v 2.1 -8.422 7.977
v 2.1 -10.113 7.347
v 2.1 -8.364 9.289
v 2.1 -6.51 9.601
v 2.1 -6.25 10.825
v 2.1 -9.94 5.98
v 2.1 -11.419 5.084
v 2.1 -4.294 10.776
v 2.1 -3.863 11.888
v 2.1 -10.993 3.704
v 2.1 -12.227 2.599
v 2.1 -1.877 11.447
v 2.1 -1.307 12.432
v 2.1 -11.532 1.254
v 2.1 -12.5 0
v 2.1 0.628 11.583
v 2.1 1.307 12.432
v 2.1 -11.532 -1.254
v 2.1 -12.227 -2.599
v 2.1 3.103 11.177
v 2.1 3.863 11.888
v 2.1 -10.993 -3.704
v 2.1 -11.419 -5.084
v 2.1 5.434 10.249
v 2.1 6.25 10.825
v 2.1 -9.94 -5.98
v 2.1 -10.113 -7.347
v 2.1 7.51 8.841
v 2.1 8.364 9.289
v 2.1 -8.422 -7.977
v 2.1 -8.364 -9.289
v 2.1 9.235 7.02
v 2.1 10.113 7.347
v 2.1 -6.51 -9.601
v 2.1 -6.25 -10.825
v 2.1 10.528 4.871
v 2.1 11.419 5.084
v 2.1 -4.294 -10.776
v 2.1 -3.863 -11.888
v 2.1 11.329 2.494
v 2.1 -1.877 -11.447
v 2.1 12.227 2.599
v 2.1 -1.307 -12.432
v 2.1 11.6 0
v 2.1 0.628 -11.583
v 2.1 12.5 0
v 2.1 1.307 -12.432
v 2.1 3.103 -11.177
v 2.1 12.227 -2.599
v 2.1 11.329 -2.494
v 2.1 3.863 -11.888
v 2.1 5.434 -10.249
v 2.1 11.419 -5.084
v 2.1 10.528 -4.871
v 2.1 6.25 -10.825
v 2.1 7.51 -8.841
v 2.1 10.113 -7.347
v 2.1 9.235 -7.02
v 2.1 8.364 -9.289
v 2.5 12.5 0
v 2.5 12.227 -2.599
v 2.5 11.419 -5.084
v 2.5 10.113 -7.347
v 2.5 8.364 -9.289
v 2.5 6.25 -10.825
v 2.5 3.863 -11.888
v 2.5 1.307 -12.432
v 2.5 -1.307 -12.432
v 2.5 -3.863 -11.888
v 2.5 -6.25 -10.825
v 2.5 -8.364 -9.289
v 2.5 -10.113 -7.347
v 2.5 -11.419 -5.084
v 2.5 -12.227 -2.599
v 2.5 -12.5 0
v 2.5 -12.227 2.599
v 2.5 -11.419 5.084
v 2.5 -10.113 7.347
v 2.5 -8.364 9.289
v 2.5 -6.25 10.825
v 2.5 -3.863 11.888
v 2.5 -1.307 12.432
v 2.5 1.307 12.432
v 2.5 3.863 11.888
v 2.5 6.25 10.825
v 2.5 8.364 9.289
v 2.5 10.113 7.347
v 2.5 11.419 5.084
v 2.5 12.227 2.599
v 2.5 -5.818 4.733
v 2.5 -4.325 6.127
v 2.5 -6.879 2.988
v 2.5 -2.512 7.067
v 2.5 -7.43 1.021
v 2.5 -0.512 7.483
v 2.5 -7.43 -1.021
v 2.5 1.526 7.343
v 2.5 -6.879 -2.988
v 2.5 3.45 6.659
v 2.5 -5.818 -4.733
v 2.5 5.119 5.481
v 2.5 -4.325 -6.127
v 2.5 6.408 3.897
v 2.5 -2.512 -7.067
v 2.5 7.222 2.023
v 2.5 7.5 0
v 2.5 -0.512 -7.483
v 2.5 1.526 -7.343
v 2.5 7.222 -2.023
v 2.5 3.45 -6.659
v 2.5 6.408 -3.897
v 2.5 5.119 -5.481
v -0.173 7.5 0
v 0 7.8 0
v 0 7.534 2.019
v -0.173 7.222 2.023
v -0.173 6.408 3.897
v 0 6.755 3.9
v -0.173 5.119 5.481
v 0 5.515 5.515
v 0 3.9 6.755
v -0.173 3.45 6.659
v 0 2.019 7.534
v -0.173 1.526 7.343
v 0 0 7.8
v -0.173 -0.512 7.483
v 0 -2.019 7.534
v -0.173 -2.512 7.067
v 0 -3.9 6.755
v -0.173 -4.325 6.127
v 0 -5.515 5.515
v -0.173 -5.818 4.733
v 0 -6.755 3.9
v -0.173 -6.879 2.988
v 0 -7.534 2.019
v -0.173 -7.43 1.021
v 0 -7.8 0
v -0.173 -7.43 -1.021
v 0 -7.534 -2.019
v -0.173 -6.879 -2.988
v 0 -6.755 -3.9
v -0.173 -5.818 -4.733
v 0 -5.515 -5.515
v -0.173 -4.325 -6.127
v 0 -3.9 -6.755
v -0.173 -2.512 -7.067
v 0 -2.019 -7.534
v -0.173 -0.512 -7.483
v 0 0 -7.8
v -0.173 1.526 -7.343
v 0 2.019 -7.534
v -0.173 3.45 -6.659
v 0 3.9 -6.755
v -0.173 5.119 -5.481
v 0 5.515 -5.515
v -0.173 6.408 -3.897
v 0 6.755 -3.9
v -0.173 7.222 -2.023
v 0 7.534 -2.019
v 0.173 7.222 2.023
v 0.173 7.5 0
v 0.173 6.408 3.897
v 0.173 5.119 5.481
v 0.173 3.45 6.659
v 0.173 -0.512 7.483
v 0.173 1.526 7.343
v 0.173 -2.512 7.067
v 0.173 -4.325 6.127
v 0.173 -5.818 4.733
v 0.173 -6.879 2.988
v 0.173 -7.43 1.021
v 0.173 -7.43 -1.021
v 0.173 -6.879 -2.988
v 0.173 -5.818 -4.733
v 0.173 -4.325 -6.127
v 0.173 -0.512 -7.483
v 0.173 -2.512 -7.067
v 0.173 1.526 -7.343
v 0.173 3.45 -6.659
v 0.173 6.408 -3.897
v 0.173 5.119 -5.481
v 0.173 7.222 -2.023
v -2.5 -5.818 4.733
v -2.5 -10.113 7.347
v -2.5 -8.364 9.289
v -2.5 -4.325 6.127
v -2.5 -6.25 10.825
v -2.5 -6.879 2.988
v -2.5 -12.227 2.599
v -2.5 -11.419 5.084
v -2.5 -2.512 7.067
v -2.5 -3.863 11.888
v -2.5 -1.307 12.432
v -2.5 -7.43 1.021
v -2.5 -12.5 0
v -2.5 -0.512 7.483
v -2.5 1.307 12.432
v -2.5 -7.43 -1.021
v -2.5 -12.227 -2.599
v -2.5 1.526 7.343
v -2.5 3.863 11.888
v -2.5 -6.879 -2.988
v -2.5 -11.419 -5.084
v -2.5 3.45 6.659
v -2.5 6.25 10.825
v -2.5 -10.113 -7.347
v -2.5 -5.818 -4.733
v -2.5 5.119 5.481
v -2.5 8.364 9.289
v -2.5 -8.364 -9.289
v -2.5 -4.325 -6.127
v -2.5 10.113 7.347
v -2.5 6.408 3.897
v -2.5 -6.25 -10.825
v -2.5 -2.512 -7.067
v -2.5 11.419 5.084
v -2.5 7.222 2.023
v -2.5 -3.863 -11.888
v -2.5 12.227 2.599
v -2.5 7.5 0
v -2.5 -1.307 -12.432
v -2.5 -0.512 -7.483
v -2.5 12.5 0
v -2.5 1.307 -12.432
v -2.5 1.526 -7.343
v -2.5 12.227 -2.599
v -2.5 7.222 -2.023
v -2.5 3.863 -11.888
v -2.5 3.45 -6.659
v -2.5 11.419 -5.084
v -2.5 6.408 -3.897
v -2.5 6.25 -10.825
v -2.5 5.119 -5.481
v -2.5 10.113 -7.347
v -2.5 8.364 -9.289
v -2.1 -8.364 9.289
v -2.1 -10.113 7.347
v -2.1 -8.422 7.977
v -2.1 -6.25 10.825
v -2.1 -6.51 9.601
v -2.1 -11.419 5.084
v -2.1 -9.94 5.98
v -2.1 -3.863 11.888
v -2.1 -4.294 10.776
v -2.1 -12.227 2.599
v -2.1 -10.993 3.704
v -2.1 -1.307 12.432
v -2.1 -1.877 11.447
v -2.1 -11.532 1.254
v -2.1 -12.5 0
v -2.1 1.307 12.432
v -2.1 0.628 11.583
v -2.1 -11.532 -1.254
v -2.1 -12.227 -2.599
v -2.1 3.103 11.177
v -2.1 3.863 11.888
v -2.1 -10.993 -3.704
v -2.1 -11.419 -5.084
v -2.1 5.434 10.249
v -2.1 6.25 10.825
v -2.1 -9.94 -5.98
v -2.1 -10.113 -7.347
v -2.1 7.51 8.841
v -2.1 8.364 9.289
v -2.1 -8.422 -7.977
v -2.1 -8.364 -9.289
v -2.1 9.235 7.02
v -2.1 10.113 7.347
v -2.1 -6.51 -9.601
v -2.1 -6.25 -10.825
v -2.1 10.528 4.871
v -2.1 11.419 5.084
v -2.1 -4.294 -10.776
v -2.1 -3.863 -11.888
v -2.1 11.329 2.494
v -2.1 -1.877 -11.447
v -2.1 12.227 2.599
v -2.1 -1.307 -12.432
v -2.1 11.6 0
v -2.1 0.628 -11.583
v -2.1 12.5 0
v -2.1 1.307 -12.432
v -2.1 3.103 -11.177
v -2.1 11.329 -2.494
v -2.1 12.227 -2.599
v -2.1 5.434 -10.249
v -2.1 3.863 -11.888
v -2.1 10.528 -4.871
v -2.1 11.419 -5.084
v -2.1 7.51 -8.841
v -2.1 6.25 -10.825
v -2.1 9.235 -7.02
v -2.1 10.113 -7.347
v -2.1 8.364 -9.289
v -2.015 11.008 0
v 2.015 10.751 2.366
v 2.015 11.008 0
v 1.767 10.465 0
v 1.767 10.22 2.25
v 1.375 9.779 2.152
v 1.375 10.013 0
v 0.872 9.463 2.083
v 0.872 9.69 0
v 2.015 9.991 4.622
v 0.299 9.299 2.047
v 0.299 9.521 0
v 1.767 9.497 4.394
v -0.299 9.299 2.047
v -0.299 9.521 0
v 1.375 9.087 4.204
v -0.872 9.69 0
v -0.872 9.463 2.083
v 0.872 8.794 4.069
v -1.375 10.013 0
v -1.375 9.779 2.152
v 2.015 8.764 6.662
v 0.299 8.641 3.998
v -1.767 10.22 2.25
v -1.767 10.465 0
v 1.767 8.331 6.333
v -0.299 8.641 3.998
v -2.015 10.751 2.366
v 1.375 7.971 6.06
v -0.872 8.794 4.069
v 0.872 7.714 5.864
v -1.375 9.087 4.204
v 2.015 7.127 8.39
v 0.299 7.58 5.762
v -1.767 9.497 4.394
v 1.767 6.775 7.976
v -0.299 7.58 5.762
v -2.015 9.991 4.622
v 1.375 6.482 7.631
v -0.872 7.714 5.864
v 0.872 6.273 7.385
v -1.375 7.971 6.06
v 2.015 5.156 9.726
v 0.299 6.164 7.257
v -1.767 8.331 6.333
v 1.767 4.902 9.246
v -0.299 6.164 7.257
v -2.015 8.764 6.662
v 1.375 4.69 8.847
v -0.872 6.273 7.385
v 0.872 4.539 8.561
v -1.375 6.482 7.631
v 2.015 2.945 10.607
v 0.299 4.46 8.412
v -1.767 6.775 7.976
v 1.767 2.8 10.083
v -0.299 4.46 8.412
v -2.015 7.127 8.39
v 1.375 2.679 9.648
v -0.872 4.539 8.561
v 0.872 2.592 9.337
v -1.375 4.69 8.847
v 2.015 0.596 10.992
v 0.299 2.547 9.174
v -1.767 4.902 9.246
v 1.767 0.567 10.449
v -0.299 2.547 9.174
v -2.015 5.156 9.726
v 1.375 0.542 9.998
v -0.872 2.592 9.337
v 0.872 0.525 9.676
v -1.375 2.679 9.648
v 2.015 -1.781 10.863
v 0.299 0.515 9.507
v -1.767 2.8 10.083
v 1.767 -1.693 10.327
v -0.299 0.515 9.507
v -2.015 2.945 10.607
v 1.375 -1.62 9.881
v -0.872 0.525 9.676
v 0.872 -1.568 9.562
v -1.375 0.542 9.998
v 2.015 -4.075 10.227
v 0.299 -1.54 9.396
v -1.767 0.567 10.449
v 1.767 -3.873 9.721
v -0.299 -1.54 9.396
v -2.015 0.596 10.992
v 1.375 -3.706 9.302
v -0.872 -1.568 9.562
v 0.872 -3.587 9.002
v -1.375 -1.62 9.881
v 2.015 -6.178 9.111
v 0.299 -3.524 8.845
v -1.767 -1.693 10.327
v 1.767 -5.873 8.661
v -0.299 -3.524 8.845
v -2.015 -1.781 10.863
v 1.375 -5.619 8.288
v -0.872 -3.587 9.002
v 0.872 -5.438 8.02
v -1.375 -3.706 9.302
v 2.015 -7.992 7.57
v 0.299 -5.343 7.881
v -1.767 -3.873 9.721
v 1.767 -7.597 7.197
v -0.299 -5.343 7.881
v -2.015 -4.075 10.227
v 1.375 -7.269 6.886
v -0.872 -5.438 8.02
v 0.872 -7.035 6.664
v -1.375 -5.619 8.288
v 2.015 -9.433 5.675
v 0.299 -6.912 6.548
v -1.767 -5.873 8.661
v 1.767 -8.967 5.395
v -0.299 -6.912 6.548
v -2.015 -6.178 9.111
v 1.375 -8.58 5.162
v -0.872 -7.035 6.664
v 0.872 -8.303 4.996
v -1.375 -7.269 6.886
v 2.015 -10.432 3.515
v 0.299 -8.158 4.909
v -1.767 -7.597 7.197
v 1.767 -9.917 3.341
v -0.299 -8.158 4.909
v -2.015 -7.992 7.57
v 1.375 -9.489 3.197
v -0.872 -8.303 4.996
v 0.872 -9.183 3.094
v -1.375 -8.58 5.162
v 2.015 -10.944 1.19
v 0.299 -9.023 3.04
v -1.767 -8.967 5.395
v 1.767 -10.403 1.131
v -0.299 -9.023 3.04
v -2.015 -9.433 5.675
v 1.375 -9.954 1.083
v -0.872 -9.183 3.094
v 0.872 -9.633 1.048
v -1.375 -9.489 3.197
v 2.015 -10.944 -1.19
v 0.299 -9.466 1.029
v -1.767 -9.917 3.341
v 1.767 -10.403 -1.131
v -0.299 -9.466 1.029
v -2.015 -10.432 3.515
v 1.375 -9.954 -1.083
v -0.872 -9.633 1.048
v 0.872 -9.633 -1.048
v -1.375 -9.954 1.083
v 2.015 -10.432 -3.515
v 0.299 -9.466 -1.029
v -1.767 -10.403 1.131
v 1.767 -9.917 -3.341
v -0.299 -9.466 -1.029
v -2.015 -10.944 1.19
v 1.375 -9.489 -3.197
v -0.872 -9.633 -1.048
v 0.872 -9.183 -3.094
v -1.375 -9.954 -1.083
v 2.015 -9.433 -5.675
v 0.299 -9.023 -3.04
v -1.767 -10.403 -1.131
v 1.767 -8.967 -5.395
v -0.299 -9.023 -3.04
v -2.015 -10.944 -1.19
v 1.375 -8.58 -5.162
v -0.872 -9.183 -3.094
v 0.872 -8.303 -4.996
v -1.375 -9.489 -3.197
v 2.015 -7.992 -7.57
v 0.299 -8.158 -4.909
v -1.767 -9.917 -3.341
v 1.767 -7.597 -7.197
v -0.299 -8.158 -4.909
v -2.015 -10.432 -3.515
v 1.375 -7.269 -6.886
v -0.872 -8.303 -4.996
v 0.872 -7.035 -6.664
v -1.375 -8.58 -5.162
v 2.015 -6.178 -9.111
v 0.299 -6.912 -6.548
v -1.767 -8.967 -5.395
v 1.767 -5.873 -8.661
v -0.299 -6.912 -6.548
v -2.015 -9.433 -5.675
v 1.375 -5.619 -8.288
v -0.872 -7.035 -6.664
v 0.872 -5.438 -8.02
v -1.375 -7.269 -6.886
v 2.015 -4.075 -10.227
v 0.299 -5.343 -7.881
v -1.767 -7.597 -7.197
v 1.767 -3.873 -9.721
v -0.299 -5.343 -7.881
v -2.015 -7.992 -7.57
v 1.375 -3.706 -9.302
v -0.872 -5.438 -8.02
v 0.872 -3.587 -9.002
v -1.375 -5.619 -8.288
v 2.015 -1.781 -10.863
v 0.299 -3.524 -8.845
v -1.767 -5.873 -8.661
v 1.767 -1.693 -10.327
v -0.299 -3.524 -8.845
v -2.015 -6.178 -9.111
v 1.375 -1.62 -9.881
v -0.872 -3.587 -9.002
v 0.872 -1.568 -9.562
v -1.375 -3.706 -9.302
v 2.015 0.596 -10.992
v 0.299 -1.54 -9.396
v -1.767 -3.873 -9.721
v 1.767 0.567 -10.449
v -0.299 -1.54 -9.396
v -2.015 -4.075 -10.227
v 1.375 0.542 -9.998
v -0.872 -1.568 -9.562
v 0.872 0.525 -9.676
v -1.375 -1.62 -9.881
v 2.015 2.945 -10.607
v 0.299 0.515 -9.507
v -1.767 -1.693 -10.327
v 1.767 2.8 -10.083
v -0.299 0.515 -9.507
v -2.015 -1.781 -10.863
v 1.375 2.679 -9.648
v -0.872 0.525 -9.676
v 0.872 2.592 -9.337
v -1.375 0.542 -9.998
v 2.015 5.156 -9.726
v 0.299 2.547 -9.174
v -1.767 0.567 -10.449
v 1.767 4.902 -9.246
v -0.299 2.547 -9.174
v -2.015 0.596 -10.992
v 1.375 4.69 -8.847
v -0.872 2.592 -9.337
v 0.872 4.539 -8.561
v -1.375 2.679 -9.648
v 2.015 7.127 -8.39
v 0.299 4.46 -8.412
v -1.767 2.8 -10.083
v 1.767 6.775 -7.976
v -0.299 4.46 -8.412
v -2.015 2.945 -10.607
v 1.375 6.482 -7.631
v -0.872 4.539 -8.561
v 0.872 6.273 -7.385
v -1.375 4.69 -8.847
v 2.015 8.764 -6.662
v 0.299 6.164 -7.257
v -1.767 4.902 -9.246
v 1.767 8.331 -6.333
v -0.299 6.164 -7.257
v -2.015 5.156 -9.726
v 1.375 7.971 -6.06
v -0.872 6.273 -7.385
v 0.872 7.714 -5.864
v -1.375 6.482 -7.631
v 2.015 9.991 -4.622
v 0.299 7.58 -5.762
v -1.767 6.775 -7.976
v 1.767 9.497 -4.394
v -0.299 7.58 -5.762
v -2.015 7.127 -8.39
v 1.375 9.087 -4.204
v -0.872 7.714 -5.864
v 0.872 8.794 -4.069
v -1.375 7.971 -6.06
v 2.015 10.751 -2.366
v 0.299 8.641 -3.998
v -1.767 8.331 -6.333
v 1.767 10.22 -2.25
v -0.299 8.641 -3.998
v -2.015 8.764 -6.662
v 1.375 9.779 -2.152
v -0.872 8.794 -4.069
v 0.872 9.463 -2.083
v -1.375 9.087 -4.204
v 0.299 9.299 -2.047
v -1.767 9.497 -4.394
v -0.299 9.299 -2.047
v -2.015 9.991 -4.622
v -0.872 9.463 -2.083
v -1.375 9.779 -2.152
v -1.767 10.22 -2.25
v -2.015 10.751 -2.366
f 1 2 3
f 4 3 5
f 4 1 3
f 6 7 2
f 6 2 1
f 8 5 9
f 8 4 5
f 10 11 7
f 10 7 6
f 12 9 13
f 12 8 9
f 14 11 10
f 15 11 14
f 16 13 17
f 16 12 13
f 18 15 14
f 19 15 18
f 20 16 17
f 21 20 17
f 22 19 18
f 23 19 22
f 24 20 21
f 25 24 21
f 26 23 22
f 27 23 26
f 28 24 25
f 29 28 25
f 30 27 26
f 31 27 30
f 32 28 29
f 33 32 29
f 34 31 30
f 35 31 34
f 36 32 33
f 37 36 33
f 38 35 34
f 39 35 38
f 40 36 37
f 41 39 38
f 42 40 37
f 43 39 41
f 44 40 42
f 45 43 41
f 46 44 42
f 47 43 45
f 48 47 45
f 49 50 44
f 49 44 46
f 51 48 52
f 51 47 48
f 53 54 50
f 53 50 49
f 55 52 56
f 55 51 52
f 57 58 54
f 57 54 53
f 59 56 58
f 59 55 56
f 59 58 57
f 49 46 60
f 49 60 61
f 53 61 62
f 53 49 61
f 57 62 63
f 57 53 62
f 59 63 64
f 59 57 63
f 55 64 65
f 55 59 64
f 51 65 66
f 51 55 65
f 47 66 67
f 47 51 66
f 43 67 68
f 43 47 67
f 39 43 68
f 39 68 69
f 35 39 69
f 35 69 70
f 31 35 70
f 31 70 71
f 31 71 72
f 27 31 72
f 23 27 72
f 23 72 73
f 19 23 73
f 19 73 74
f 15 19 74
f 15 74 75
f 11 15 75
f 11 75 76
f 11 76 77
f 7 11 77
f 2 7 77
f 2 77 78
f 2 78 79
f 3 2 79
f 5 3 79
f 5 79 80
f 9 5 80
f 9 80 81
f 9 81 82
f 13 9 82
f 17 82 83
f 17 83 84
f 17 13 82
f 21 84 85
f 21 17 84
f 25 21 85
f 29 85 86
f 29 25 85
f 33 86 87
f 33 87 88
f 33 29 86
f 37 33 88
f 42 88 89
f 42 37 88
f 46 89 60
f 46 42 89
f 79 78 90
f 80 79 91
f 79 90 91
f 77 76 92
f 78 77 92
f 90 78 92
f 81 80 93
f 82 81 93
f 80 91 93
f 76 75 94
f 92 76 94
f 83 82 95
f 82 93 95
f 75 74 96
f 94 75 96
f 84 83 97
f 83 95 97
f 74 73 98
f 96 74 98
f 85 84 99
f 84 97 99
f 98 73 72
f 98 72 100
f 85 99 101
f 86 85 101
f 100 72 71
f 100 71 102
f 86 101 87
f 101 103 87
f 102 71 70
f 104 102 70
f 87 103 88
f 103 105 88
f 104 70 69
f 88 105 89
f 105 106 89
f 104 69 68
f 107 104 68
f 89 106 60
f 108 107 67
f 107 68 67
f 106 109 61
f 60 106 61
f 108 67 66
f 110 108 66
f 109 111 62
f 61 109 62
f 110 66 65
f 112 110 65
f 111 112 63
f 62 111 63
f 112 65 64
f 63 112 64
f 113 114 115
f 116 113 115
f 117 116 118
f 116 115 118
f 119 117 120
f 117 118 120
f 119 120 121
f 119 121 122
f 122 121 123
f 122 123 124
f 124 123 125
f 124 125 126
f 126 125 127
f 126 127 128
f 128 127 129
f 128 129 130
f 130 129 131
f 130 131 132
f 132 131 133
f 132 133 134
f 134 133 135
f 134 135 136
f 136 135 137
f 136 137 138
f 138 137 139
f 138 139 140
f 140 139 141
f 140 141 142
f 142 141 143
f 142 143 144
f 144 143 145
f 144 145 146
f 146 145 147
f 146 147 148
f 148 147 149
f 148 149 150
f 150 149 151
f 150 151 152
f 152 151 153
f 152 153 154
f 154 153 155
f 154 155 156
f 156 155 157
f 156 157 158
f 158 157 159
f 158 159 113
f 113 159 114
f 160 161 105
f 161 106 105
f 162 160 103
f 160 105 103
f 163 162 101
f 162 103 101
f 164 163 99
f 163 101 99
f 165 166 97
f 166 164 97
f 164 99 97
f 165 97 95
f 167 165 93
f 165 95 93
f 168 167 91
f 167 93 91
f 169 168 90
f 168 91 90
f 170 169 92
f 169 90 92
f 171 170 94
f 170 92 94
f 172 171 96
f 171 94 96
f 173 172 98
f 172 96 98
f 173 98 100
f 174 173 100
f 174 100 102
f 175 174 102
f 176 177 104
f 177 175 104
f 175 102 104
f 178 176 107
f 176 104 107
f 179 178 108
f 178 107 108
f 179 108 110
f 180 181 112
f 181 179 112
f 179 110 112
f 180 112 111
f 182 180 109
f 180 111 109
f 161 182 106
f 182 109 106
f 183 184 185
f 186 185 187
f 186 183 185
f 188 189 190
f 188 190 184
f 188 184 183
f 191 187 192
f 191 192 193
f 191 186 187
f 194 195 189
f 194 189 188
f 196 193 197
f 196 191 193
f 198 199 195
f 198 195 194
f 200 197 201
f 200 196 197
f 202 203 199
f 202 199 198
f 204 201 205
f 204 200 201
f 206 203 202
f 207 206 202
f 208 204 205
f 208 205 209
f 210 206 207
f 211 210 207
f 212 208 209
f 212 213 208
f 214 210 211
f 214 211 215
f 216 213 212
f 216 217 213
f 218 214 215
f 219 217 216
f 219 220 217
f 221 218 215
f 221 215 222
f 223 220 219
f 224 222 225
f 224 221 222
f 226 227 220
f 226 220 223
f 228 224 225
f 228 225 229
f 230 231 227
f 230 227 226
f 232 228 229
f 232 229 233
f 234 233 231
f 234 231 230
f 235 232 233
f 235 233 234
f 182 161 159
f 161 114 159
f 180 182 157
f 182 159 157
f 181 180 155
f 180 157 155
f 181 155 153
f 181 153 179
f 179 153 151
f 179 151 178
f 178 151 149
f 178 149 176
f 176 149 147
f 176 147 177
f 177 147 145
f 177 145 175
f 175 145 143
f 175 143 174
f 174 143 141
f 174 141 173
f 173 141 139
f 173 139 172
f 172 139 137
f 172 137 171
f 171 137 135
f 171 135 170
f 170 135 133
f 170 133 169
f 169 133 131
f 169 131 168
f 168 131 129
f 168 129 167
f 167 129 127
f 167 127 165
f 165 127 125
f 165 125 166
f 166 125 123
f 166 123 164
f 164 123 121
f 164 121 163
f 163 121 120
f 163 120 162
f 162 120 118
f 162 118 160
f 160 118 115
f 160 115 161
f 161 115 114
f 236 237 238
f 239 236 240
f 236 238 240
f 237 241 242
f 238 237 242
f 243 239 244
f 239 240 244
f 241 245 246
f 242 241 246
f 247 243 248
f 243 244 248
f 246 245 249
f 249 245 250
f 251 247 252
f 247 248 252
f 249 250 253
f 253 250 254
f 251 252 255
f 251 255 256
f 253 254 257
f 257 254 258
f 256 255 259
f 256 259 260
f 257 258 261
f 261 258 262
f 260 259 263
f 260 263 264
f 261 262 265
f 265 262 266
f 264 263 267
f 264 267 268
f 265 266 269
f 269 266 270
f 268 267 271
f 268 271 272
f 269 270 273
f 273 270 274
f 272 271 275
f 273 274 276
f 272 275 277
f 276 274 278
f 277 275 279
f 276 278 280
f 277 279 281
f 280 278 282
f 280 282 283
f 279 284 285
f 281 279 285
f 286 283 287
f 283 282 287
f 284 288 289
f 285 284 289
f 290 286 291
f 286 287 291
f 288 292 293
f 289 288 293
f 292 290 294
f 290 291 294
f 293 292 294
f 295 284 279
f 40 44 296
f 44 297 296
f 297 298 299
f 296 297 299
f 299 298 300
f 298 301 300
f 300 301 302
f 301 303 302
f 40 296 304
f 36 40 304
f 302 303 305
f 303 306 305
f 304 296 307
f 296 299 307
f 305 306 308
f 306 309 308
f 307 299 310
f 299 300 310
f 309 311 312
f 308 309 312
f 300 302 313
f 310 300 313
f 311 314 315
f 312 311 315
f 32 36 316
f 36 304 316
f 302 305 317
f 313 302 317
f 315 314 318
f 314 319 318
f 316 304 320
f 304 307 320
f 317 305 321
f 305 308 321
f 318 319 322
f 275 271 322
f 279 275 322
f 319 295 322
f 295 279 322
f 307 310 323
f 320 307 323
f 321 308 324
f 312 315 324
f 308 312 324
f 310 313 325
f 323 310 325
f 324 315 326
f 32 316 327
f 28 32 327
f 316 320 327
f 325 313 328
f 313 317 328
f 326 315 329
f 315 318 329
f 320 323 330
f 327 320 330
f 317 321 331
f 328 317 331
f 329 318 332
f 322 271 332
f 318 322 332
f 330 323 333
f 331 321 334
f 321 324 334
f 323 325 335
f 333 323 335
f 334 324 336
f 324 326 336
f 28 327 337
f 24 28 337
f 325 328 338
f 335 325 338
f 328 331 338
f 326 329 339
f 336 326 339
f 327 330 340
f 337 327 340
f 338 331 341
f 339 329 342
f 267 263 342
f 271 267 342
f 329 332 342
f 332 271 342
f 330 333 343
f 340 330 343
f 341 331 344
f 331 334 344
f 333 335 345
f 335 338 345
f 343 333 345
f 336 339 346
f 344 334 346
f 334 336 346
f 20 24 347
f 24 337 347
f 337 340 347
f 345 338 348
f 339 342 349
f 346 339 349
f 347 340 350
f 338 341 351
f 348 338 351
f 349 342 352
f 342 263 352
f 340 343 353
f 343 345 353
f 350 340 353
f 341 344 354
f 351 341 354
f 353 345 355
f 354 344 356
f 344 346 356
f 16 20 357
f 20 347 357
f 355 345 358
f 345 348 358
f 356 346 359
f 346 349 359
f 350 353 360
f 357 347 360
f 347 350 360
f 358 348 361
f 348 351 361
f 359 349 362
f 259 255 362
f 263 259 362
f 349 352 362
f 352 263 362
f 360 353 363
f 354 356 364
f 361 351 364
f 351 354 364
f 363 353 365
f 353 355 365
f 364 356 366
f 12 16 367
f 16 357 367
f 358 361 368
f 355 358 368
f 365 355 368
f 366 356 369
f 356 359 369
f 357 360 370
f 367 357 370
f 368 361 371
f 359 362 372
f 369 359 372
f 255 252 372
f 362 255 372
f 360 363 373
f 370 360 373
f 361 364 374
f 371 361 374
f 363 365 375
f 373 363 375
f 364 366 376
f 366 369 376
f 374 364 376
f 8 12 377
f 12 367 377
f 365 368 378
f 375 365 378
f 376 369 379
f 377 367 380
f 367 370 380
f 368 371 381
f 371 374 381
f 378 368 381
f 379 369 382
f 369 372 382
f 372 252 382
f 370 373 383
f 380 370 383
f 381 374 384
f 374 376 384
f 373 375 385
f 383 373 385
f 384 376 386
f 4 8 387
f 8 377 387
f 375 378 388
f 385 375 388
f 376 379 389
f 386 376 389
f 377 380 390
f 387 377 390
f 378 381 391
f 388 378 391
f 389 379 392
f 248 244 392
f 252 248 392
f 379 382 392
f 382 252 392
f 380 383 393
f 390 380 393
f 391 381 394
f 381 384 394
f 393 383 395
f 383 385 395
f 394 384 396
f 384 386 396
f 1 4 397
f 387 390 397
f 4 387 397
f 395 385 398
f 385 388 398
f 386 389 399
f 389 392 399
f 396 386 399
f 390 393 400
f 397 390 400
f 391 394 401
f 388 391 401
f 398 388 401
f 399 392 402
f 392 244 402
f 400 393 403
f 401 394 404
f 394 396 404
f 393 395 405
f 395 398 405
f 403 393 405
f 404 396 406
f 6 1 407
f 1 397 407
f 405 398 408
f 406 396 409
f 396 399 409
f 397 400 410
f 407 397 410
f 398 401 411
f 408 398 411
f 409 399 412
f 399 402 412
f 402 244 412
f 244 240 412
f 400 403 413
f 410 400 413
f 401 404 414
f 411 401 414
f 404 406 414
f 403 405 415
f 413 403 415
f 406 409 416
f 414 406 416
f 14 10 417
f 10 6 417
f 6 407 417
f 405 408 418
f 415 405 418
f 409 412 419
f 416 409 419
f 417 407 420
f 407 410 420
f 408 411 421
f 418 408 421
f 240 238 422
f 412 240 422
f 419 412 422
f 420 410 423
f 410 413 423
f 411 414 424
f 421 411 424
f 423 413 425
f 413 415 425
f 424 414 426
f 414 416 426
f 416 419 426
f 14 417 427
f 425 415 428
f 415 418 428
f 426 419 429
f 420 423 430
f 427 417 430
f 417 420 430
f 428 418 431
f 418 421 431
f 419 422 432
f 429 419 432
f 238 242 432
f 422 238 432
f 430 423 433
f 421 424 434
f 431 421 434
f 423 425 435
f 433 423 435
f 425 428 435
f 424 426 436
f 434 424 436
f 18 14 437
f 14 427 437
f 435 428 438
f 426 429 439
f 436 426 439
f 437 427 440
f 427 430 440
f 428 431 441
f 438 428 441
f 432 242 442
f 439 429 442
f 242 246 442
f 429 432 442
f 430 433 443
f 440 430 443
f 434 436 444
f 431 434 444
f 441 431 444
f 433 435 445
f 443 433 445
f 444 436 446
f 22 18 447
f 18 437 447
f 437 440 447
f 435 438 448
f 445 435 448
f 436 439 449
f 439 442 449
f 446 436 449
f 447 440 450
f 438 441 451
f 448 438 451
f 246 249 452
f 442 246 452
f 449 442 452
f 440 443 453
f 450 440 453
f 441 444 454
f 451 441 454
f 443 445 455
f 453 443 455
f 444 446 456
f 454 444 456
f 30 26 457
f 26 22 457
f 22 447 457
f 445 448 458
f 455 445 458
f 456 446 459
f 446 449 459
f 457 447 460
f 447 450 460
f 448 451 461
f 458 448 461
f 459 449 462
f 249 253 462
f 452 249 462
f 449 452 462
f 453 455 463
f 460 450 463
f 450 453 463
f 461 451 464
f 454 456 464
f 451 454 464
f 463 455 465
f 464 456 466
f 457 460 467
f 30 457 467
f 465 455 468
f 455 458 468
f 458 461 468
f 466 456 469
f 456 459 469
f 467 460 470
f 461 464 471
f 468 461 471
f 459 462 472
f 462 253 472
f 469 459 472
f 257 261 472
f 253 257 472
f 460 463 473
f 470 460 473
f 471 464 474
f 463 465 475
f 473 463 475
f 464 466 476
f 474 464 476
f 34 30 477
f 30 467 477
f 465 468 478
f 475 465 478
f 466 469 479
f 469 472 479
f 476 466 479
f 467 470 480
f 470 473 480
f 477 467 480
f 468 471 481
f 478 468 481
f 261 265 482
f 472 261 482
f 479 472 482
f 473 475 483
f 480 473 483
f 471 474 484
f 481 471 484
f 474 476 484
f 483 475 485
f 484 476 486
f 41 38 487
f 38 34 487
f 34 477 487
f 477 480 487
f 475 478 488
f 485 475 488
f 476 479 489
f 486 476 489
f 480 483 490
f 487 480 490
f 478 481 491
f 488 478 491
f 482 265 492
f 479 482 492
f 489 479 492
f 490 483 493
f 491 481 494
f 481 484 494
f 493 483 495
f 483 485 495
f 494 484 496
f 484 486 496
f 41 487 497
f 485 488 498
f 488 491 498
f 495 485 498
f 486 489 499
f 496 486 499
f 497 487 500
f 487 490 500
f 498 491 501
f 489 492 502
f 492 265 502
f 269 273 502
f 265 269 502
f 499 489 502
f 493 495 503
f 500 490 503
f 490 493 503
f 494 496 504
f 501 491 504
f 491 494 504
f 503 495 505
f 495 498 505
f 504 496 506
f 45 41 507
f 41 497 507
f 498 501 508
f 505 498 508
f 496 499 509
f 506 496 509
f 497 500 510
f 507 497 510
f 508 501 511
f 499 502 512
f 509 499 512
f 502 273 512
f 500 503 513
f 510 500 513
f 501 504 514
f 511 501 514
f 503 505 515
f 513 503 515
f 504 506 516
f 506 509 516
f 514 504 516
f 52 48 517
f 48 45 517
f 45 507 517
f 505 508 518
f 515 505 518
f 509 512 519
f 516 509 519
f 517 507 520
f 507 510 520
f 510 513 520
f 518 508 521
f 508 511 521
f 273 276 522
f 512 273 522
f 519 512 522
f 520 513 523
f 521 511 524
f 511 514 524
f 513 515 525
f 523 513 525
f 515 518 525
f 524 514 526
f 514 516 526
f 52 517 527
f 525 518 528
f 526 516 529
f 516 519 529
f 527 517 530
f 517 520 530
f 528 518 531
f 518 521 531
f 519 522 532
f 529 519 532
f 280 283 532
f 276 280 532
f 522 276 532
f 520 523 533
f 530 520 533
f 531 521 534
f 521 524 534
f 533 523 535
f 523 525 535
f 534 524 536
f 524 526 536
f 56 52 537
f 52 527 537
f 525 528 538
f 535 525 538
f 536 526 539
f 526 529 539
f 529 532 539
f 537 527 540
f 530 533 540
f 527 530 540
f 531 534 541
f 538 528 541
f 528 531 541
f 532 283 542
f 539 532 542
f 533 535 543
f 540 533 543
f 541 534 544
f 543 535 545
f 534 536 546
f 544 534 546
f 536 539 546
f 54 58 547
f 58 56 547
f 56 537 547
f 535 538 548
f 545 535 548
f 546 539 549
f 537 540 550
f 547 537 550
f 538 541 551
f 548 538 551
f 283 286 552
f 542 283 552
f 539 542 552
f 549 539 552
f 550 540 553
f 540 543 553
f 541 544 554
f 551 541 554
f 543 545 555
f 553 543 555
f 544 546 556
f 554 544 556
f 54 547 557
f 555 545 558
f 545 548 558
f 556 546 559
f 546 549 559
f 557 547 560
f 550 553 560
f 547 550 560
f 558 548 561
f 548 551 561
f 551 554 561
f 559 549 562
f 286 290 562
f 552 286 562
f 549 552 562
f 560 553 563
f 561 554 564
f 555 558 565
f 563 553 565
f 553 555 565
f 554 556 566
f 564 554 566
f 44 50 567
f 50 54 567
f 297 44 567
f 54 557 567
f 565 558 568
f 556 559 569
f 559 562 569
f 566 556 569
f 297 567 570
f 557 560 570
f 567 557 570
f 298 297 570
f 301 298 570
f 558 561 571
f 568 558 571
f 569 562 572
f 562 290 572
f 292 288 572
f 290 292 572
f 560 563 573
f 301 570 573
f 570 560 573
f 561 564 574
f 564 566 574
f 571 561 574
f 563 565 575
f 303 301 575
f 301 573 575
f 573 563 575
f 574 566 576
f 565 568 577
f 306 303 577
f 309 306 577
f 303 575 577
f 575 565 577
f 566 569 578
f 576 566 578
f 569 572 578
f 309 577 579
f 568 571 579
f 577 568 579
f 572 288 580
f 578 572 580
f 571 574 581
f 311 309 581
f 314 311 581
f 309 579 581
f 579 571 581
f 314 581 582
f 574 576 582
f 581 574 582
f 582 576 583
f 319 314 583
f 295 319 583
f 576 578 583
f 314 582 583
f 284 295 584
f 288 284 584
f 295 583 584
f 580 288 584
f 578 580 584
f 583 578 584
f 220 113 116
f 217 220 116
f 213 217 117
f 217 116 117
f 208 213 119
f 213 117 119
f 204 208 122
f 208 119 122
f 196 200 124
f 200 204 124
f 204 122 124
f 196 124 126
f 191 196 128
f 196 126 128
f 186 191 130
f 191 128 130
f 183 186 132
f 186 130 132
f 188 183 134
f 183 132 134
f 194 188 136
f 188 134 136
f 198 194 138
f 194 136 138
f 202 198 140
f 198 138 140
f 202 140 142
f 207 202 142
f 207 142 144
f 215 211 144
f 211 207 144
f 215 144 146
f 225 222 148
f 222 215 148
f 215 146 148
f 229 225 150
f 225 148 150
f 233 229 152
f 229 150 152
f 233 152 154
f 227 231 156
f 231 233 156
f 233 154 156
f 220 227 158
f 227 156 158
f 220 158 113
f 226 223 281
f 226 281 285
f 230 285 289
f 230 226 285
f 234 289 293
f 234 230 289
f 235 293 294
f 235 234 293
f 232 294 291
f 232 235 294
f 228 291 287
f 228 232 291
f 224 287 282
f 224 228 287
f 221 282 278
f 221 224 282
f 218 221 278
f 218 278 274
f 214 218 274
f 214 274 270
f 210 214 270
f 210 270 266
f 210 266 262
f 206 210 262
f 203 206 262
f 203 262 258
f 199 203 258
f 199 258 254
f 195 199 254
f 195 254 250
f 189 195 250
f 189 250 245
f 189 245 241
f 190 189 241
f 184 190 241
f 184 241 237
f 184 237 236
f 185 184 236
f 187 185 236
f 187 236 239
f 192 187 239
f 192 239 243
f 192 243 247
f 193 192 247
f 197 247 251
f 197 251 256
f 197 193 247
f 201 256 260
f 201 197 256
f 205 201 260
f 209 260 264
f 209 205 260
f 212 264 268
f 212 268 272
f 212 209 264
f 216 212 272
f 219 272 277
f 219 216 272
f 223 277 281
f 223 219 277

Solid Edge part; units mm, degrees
sketch "Sketch1" plane through (0, 0, 0) normal (0, 0, 1) x (1, 0, 0)
  line L0 (-2.5, 12.5) -> (-2.5, 7.5)
  line L1 (-2.5, 7.5) -> (-0.1732, 7.5)
  line L2 (-0.1732, 7.5) -> (0, 7.8)
  line L3 (0, 7.8) -> (0.1732, 7.5)
  line L4 (0.1732, 7.5) -> (2.5, 7.5)
  line L5 (2.5, 7.5) -> (2.5, 12.5)
  line L6 (2.5, 12.5) -> (2.1, 12.5)
  line L7 (2.1, 12.5) -> (2.1, 11.6)
  arc A0 (2.1, 11.6) -> (-2.1, 11.6) centre (0, 11.6) cw
  line L8 (-2.1, 11.6) -> (-2.1, 12.5)
  line L9 (-2.1, 12.5) -> (-2.5, 12.5)
revolve "RevolvedProtrusion1" add sketch "Sketch1" angle 360 about axis through (2.5, 0, 0) along (-1, 0, 0)
properties material "Steel"
